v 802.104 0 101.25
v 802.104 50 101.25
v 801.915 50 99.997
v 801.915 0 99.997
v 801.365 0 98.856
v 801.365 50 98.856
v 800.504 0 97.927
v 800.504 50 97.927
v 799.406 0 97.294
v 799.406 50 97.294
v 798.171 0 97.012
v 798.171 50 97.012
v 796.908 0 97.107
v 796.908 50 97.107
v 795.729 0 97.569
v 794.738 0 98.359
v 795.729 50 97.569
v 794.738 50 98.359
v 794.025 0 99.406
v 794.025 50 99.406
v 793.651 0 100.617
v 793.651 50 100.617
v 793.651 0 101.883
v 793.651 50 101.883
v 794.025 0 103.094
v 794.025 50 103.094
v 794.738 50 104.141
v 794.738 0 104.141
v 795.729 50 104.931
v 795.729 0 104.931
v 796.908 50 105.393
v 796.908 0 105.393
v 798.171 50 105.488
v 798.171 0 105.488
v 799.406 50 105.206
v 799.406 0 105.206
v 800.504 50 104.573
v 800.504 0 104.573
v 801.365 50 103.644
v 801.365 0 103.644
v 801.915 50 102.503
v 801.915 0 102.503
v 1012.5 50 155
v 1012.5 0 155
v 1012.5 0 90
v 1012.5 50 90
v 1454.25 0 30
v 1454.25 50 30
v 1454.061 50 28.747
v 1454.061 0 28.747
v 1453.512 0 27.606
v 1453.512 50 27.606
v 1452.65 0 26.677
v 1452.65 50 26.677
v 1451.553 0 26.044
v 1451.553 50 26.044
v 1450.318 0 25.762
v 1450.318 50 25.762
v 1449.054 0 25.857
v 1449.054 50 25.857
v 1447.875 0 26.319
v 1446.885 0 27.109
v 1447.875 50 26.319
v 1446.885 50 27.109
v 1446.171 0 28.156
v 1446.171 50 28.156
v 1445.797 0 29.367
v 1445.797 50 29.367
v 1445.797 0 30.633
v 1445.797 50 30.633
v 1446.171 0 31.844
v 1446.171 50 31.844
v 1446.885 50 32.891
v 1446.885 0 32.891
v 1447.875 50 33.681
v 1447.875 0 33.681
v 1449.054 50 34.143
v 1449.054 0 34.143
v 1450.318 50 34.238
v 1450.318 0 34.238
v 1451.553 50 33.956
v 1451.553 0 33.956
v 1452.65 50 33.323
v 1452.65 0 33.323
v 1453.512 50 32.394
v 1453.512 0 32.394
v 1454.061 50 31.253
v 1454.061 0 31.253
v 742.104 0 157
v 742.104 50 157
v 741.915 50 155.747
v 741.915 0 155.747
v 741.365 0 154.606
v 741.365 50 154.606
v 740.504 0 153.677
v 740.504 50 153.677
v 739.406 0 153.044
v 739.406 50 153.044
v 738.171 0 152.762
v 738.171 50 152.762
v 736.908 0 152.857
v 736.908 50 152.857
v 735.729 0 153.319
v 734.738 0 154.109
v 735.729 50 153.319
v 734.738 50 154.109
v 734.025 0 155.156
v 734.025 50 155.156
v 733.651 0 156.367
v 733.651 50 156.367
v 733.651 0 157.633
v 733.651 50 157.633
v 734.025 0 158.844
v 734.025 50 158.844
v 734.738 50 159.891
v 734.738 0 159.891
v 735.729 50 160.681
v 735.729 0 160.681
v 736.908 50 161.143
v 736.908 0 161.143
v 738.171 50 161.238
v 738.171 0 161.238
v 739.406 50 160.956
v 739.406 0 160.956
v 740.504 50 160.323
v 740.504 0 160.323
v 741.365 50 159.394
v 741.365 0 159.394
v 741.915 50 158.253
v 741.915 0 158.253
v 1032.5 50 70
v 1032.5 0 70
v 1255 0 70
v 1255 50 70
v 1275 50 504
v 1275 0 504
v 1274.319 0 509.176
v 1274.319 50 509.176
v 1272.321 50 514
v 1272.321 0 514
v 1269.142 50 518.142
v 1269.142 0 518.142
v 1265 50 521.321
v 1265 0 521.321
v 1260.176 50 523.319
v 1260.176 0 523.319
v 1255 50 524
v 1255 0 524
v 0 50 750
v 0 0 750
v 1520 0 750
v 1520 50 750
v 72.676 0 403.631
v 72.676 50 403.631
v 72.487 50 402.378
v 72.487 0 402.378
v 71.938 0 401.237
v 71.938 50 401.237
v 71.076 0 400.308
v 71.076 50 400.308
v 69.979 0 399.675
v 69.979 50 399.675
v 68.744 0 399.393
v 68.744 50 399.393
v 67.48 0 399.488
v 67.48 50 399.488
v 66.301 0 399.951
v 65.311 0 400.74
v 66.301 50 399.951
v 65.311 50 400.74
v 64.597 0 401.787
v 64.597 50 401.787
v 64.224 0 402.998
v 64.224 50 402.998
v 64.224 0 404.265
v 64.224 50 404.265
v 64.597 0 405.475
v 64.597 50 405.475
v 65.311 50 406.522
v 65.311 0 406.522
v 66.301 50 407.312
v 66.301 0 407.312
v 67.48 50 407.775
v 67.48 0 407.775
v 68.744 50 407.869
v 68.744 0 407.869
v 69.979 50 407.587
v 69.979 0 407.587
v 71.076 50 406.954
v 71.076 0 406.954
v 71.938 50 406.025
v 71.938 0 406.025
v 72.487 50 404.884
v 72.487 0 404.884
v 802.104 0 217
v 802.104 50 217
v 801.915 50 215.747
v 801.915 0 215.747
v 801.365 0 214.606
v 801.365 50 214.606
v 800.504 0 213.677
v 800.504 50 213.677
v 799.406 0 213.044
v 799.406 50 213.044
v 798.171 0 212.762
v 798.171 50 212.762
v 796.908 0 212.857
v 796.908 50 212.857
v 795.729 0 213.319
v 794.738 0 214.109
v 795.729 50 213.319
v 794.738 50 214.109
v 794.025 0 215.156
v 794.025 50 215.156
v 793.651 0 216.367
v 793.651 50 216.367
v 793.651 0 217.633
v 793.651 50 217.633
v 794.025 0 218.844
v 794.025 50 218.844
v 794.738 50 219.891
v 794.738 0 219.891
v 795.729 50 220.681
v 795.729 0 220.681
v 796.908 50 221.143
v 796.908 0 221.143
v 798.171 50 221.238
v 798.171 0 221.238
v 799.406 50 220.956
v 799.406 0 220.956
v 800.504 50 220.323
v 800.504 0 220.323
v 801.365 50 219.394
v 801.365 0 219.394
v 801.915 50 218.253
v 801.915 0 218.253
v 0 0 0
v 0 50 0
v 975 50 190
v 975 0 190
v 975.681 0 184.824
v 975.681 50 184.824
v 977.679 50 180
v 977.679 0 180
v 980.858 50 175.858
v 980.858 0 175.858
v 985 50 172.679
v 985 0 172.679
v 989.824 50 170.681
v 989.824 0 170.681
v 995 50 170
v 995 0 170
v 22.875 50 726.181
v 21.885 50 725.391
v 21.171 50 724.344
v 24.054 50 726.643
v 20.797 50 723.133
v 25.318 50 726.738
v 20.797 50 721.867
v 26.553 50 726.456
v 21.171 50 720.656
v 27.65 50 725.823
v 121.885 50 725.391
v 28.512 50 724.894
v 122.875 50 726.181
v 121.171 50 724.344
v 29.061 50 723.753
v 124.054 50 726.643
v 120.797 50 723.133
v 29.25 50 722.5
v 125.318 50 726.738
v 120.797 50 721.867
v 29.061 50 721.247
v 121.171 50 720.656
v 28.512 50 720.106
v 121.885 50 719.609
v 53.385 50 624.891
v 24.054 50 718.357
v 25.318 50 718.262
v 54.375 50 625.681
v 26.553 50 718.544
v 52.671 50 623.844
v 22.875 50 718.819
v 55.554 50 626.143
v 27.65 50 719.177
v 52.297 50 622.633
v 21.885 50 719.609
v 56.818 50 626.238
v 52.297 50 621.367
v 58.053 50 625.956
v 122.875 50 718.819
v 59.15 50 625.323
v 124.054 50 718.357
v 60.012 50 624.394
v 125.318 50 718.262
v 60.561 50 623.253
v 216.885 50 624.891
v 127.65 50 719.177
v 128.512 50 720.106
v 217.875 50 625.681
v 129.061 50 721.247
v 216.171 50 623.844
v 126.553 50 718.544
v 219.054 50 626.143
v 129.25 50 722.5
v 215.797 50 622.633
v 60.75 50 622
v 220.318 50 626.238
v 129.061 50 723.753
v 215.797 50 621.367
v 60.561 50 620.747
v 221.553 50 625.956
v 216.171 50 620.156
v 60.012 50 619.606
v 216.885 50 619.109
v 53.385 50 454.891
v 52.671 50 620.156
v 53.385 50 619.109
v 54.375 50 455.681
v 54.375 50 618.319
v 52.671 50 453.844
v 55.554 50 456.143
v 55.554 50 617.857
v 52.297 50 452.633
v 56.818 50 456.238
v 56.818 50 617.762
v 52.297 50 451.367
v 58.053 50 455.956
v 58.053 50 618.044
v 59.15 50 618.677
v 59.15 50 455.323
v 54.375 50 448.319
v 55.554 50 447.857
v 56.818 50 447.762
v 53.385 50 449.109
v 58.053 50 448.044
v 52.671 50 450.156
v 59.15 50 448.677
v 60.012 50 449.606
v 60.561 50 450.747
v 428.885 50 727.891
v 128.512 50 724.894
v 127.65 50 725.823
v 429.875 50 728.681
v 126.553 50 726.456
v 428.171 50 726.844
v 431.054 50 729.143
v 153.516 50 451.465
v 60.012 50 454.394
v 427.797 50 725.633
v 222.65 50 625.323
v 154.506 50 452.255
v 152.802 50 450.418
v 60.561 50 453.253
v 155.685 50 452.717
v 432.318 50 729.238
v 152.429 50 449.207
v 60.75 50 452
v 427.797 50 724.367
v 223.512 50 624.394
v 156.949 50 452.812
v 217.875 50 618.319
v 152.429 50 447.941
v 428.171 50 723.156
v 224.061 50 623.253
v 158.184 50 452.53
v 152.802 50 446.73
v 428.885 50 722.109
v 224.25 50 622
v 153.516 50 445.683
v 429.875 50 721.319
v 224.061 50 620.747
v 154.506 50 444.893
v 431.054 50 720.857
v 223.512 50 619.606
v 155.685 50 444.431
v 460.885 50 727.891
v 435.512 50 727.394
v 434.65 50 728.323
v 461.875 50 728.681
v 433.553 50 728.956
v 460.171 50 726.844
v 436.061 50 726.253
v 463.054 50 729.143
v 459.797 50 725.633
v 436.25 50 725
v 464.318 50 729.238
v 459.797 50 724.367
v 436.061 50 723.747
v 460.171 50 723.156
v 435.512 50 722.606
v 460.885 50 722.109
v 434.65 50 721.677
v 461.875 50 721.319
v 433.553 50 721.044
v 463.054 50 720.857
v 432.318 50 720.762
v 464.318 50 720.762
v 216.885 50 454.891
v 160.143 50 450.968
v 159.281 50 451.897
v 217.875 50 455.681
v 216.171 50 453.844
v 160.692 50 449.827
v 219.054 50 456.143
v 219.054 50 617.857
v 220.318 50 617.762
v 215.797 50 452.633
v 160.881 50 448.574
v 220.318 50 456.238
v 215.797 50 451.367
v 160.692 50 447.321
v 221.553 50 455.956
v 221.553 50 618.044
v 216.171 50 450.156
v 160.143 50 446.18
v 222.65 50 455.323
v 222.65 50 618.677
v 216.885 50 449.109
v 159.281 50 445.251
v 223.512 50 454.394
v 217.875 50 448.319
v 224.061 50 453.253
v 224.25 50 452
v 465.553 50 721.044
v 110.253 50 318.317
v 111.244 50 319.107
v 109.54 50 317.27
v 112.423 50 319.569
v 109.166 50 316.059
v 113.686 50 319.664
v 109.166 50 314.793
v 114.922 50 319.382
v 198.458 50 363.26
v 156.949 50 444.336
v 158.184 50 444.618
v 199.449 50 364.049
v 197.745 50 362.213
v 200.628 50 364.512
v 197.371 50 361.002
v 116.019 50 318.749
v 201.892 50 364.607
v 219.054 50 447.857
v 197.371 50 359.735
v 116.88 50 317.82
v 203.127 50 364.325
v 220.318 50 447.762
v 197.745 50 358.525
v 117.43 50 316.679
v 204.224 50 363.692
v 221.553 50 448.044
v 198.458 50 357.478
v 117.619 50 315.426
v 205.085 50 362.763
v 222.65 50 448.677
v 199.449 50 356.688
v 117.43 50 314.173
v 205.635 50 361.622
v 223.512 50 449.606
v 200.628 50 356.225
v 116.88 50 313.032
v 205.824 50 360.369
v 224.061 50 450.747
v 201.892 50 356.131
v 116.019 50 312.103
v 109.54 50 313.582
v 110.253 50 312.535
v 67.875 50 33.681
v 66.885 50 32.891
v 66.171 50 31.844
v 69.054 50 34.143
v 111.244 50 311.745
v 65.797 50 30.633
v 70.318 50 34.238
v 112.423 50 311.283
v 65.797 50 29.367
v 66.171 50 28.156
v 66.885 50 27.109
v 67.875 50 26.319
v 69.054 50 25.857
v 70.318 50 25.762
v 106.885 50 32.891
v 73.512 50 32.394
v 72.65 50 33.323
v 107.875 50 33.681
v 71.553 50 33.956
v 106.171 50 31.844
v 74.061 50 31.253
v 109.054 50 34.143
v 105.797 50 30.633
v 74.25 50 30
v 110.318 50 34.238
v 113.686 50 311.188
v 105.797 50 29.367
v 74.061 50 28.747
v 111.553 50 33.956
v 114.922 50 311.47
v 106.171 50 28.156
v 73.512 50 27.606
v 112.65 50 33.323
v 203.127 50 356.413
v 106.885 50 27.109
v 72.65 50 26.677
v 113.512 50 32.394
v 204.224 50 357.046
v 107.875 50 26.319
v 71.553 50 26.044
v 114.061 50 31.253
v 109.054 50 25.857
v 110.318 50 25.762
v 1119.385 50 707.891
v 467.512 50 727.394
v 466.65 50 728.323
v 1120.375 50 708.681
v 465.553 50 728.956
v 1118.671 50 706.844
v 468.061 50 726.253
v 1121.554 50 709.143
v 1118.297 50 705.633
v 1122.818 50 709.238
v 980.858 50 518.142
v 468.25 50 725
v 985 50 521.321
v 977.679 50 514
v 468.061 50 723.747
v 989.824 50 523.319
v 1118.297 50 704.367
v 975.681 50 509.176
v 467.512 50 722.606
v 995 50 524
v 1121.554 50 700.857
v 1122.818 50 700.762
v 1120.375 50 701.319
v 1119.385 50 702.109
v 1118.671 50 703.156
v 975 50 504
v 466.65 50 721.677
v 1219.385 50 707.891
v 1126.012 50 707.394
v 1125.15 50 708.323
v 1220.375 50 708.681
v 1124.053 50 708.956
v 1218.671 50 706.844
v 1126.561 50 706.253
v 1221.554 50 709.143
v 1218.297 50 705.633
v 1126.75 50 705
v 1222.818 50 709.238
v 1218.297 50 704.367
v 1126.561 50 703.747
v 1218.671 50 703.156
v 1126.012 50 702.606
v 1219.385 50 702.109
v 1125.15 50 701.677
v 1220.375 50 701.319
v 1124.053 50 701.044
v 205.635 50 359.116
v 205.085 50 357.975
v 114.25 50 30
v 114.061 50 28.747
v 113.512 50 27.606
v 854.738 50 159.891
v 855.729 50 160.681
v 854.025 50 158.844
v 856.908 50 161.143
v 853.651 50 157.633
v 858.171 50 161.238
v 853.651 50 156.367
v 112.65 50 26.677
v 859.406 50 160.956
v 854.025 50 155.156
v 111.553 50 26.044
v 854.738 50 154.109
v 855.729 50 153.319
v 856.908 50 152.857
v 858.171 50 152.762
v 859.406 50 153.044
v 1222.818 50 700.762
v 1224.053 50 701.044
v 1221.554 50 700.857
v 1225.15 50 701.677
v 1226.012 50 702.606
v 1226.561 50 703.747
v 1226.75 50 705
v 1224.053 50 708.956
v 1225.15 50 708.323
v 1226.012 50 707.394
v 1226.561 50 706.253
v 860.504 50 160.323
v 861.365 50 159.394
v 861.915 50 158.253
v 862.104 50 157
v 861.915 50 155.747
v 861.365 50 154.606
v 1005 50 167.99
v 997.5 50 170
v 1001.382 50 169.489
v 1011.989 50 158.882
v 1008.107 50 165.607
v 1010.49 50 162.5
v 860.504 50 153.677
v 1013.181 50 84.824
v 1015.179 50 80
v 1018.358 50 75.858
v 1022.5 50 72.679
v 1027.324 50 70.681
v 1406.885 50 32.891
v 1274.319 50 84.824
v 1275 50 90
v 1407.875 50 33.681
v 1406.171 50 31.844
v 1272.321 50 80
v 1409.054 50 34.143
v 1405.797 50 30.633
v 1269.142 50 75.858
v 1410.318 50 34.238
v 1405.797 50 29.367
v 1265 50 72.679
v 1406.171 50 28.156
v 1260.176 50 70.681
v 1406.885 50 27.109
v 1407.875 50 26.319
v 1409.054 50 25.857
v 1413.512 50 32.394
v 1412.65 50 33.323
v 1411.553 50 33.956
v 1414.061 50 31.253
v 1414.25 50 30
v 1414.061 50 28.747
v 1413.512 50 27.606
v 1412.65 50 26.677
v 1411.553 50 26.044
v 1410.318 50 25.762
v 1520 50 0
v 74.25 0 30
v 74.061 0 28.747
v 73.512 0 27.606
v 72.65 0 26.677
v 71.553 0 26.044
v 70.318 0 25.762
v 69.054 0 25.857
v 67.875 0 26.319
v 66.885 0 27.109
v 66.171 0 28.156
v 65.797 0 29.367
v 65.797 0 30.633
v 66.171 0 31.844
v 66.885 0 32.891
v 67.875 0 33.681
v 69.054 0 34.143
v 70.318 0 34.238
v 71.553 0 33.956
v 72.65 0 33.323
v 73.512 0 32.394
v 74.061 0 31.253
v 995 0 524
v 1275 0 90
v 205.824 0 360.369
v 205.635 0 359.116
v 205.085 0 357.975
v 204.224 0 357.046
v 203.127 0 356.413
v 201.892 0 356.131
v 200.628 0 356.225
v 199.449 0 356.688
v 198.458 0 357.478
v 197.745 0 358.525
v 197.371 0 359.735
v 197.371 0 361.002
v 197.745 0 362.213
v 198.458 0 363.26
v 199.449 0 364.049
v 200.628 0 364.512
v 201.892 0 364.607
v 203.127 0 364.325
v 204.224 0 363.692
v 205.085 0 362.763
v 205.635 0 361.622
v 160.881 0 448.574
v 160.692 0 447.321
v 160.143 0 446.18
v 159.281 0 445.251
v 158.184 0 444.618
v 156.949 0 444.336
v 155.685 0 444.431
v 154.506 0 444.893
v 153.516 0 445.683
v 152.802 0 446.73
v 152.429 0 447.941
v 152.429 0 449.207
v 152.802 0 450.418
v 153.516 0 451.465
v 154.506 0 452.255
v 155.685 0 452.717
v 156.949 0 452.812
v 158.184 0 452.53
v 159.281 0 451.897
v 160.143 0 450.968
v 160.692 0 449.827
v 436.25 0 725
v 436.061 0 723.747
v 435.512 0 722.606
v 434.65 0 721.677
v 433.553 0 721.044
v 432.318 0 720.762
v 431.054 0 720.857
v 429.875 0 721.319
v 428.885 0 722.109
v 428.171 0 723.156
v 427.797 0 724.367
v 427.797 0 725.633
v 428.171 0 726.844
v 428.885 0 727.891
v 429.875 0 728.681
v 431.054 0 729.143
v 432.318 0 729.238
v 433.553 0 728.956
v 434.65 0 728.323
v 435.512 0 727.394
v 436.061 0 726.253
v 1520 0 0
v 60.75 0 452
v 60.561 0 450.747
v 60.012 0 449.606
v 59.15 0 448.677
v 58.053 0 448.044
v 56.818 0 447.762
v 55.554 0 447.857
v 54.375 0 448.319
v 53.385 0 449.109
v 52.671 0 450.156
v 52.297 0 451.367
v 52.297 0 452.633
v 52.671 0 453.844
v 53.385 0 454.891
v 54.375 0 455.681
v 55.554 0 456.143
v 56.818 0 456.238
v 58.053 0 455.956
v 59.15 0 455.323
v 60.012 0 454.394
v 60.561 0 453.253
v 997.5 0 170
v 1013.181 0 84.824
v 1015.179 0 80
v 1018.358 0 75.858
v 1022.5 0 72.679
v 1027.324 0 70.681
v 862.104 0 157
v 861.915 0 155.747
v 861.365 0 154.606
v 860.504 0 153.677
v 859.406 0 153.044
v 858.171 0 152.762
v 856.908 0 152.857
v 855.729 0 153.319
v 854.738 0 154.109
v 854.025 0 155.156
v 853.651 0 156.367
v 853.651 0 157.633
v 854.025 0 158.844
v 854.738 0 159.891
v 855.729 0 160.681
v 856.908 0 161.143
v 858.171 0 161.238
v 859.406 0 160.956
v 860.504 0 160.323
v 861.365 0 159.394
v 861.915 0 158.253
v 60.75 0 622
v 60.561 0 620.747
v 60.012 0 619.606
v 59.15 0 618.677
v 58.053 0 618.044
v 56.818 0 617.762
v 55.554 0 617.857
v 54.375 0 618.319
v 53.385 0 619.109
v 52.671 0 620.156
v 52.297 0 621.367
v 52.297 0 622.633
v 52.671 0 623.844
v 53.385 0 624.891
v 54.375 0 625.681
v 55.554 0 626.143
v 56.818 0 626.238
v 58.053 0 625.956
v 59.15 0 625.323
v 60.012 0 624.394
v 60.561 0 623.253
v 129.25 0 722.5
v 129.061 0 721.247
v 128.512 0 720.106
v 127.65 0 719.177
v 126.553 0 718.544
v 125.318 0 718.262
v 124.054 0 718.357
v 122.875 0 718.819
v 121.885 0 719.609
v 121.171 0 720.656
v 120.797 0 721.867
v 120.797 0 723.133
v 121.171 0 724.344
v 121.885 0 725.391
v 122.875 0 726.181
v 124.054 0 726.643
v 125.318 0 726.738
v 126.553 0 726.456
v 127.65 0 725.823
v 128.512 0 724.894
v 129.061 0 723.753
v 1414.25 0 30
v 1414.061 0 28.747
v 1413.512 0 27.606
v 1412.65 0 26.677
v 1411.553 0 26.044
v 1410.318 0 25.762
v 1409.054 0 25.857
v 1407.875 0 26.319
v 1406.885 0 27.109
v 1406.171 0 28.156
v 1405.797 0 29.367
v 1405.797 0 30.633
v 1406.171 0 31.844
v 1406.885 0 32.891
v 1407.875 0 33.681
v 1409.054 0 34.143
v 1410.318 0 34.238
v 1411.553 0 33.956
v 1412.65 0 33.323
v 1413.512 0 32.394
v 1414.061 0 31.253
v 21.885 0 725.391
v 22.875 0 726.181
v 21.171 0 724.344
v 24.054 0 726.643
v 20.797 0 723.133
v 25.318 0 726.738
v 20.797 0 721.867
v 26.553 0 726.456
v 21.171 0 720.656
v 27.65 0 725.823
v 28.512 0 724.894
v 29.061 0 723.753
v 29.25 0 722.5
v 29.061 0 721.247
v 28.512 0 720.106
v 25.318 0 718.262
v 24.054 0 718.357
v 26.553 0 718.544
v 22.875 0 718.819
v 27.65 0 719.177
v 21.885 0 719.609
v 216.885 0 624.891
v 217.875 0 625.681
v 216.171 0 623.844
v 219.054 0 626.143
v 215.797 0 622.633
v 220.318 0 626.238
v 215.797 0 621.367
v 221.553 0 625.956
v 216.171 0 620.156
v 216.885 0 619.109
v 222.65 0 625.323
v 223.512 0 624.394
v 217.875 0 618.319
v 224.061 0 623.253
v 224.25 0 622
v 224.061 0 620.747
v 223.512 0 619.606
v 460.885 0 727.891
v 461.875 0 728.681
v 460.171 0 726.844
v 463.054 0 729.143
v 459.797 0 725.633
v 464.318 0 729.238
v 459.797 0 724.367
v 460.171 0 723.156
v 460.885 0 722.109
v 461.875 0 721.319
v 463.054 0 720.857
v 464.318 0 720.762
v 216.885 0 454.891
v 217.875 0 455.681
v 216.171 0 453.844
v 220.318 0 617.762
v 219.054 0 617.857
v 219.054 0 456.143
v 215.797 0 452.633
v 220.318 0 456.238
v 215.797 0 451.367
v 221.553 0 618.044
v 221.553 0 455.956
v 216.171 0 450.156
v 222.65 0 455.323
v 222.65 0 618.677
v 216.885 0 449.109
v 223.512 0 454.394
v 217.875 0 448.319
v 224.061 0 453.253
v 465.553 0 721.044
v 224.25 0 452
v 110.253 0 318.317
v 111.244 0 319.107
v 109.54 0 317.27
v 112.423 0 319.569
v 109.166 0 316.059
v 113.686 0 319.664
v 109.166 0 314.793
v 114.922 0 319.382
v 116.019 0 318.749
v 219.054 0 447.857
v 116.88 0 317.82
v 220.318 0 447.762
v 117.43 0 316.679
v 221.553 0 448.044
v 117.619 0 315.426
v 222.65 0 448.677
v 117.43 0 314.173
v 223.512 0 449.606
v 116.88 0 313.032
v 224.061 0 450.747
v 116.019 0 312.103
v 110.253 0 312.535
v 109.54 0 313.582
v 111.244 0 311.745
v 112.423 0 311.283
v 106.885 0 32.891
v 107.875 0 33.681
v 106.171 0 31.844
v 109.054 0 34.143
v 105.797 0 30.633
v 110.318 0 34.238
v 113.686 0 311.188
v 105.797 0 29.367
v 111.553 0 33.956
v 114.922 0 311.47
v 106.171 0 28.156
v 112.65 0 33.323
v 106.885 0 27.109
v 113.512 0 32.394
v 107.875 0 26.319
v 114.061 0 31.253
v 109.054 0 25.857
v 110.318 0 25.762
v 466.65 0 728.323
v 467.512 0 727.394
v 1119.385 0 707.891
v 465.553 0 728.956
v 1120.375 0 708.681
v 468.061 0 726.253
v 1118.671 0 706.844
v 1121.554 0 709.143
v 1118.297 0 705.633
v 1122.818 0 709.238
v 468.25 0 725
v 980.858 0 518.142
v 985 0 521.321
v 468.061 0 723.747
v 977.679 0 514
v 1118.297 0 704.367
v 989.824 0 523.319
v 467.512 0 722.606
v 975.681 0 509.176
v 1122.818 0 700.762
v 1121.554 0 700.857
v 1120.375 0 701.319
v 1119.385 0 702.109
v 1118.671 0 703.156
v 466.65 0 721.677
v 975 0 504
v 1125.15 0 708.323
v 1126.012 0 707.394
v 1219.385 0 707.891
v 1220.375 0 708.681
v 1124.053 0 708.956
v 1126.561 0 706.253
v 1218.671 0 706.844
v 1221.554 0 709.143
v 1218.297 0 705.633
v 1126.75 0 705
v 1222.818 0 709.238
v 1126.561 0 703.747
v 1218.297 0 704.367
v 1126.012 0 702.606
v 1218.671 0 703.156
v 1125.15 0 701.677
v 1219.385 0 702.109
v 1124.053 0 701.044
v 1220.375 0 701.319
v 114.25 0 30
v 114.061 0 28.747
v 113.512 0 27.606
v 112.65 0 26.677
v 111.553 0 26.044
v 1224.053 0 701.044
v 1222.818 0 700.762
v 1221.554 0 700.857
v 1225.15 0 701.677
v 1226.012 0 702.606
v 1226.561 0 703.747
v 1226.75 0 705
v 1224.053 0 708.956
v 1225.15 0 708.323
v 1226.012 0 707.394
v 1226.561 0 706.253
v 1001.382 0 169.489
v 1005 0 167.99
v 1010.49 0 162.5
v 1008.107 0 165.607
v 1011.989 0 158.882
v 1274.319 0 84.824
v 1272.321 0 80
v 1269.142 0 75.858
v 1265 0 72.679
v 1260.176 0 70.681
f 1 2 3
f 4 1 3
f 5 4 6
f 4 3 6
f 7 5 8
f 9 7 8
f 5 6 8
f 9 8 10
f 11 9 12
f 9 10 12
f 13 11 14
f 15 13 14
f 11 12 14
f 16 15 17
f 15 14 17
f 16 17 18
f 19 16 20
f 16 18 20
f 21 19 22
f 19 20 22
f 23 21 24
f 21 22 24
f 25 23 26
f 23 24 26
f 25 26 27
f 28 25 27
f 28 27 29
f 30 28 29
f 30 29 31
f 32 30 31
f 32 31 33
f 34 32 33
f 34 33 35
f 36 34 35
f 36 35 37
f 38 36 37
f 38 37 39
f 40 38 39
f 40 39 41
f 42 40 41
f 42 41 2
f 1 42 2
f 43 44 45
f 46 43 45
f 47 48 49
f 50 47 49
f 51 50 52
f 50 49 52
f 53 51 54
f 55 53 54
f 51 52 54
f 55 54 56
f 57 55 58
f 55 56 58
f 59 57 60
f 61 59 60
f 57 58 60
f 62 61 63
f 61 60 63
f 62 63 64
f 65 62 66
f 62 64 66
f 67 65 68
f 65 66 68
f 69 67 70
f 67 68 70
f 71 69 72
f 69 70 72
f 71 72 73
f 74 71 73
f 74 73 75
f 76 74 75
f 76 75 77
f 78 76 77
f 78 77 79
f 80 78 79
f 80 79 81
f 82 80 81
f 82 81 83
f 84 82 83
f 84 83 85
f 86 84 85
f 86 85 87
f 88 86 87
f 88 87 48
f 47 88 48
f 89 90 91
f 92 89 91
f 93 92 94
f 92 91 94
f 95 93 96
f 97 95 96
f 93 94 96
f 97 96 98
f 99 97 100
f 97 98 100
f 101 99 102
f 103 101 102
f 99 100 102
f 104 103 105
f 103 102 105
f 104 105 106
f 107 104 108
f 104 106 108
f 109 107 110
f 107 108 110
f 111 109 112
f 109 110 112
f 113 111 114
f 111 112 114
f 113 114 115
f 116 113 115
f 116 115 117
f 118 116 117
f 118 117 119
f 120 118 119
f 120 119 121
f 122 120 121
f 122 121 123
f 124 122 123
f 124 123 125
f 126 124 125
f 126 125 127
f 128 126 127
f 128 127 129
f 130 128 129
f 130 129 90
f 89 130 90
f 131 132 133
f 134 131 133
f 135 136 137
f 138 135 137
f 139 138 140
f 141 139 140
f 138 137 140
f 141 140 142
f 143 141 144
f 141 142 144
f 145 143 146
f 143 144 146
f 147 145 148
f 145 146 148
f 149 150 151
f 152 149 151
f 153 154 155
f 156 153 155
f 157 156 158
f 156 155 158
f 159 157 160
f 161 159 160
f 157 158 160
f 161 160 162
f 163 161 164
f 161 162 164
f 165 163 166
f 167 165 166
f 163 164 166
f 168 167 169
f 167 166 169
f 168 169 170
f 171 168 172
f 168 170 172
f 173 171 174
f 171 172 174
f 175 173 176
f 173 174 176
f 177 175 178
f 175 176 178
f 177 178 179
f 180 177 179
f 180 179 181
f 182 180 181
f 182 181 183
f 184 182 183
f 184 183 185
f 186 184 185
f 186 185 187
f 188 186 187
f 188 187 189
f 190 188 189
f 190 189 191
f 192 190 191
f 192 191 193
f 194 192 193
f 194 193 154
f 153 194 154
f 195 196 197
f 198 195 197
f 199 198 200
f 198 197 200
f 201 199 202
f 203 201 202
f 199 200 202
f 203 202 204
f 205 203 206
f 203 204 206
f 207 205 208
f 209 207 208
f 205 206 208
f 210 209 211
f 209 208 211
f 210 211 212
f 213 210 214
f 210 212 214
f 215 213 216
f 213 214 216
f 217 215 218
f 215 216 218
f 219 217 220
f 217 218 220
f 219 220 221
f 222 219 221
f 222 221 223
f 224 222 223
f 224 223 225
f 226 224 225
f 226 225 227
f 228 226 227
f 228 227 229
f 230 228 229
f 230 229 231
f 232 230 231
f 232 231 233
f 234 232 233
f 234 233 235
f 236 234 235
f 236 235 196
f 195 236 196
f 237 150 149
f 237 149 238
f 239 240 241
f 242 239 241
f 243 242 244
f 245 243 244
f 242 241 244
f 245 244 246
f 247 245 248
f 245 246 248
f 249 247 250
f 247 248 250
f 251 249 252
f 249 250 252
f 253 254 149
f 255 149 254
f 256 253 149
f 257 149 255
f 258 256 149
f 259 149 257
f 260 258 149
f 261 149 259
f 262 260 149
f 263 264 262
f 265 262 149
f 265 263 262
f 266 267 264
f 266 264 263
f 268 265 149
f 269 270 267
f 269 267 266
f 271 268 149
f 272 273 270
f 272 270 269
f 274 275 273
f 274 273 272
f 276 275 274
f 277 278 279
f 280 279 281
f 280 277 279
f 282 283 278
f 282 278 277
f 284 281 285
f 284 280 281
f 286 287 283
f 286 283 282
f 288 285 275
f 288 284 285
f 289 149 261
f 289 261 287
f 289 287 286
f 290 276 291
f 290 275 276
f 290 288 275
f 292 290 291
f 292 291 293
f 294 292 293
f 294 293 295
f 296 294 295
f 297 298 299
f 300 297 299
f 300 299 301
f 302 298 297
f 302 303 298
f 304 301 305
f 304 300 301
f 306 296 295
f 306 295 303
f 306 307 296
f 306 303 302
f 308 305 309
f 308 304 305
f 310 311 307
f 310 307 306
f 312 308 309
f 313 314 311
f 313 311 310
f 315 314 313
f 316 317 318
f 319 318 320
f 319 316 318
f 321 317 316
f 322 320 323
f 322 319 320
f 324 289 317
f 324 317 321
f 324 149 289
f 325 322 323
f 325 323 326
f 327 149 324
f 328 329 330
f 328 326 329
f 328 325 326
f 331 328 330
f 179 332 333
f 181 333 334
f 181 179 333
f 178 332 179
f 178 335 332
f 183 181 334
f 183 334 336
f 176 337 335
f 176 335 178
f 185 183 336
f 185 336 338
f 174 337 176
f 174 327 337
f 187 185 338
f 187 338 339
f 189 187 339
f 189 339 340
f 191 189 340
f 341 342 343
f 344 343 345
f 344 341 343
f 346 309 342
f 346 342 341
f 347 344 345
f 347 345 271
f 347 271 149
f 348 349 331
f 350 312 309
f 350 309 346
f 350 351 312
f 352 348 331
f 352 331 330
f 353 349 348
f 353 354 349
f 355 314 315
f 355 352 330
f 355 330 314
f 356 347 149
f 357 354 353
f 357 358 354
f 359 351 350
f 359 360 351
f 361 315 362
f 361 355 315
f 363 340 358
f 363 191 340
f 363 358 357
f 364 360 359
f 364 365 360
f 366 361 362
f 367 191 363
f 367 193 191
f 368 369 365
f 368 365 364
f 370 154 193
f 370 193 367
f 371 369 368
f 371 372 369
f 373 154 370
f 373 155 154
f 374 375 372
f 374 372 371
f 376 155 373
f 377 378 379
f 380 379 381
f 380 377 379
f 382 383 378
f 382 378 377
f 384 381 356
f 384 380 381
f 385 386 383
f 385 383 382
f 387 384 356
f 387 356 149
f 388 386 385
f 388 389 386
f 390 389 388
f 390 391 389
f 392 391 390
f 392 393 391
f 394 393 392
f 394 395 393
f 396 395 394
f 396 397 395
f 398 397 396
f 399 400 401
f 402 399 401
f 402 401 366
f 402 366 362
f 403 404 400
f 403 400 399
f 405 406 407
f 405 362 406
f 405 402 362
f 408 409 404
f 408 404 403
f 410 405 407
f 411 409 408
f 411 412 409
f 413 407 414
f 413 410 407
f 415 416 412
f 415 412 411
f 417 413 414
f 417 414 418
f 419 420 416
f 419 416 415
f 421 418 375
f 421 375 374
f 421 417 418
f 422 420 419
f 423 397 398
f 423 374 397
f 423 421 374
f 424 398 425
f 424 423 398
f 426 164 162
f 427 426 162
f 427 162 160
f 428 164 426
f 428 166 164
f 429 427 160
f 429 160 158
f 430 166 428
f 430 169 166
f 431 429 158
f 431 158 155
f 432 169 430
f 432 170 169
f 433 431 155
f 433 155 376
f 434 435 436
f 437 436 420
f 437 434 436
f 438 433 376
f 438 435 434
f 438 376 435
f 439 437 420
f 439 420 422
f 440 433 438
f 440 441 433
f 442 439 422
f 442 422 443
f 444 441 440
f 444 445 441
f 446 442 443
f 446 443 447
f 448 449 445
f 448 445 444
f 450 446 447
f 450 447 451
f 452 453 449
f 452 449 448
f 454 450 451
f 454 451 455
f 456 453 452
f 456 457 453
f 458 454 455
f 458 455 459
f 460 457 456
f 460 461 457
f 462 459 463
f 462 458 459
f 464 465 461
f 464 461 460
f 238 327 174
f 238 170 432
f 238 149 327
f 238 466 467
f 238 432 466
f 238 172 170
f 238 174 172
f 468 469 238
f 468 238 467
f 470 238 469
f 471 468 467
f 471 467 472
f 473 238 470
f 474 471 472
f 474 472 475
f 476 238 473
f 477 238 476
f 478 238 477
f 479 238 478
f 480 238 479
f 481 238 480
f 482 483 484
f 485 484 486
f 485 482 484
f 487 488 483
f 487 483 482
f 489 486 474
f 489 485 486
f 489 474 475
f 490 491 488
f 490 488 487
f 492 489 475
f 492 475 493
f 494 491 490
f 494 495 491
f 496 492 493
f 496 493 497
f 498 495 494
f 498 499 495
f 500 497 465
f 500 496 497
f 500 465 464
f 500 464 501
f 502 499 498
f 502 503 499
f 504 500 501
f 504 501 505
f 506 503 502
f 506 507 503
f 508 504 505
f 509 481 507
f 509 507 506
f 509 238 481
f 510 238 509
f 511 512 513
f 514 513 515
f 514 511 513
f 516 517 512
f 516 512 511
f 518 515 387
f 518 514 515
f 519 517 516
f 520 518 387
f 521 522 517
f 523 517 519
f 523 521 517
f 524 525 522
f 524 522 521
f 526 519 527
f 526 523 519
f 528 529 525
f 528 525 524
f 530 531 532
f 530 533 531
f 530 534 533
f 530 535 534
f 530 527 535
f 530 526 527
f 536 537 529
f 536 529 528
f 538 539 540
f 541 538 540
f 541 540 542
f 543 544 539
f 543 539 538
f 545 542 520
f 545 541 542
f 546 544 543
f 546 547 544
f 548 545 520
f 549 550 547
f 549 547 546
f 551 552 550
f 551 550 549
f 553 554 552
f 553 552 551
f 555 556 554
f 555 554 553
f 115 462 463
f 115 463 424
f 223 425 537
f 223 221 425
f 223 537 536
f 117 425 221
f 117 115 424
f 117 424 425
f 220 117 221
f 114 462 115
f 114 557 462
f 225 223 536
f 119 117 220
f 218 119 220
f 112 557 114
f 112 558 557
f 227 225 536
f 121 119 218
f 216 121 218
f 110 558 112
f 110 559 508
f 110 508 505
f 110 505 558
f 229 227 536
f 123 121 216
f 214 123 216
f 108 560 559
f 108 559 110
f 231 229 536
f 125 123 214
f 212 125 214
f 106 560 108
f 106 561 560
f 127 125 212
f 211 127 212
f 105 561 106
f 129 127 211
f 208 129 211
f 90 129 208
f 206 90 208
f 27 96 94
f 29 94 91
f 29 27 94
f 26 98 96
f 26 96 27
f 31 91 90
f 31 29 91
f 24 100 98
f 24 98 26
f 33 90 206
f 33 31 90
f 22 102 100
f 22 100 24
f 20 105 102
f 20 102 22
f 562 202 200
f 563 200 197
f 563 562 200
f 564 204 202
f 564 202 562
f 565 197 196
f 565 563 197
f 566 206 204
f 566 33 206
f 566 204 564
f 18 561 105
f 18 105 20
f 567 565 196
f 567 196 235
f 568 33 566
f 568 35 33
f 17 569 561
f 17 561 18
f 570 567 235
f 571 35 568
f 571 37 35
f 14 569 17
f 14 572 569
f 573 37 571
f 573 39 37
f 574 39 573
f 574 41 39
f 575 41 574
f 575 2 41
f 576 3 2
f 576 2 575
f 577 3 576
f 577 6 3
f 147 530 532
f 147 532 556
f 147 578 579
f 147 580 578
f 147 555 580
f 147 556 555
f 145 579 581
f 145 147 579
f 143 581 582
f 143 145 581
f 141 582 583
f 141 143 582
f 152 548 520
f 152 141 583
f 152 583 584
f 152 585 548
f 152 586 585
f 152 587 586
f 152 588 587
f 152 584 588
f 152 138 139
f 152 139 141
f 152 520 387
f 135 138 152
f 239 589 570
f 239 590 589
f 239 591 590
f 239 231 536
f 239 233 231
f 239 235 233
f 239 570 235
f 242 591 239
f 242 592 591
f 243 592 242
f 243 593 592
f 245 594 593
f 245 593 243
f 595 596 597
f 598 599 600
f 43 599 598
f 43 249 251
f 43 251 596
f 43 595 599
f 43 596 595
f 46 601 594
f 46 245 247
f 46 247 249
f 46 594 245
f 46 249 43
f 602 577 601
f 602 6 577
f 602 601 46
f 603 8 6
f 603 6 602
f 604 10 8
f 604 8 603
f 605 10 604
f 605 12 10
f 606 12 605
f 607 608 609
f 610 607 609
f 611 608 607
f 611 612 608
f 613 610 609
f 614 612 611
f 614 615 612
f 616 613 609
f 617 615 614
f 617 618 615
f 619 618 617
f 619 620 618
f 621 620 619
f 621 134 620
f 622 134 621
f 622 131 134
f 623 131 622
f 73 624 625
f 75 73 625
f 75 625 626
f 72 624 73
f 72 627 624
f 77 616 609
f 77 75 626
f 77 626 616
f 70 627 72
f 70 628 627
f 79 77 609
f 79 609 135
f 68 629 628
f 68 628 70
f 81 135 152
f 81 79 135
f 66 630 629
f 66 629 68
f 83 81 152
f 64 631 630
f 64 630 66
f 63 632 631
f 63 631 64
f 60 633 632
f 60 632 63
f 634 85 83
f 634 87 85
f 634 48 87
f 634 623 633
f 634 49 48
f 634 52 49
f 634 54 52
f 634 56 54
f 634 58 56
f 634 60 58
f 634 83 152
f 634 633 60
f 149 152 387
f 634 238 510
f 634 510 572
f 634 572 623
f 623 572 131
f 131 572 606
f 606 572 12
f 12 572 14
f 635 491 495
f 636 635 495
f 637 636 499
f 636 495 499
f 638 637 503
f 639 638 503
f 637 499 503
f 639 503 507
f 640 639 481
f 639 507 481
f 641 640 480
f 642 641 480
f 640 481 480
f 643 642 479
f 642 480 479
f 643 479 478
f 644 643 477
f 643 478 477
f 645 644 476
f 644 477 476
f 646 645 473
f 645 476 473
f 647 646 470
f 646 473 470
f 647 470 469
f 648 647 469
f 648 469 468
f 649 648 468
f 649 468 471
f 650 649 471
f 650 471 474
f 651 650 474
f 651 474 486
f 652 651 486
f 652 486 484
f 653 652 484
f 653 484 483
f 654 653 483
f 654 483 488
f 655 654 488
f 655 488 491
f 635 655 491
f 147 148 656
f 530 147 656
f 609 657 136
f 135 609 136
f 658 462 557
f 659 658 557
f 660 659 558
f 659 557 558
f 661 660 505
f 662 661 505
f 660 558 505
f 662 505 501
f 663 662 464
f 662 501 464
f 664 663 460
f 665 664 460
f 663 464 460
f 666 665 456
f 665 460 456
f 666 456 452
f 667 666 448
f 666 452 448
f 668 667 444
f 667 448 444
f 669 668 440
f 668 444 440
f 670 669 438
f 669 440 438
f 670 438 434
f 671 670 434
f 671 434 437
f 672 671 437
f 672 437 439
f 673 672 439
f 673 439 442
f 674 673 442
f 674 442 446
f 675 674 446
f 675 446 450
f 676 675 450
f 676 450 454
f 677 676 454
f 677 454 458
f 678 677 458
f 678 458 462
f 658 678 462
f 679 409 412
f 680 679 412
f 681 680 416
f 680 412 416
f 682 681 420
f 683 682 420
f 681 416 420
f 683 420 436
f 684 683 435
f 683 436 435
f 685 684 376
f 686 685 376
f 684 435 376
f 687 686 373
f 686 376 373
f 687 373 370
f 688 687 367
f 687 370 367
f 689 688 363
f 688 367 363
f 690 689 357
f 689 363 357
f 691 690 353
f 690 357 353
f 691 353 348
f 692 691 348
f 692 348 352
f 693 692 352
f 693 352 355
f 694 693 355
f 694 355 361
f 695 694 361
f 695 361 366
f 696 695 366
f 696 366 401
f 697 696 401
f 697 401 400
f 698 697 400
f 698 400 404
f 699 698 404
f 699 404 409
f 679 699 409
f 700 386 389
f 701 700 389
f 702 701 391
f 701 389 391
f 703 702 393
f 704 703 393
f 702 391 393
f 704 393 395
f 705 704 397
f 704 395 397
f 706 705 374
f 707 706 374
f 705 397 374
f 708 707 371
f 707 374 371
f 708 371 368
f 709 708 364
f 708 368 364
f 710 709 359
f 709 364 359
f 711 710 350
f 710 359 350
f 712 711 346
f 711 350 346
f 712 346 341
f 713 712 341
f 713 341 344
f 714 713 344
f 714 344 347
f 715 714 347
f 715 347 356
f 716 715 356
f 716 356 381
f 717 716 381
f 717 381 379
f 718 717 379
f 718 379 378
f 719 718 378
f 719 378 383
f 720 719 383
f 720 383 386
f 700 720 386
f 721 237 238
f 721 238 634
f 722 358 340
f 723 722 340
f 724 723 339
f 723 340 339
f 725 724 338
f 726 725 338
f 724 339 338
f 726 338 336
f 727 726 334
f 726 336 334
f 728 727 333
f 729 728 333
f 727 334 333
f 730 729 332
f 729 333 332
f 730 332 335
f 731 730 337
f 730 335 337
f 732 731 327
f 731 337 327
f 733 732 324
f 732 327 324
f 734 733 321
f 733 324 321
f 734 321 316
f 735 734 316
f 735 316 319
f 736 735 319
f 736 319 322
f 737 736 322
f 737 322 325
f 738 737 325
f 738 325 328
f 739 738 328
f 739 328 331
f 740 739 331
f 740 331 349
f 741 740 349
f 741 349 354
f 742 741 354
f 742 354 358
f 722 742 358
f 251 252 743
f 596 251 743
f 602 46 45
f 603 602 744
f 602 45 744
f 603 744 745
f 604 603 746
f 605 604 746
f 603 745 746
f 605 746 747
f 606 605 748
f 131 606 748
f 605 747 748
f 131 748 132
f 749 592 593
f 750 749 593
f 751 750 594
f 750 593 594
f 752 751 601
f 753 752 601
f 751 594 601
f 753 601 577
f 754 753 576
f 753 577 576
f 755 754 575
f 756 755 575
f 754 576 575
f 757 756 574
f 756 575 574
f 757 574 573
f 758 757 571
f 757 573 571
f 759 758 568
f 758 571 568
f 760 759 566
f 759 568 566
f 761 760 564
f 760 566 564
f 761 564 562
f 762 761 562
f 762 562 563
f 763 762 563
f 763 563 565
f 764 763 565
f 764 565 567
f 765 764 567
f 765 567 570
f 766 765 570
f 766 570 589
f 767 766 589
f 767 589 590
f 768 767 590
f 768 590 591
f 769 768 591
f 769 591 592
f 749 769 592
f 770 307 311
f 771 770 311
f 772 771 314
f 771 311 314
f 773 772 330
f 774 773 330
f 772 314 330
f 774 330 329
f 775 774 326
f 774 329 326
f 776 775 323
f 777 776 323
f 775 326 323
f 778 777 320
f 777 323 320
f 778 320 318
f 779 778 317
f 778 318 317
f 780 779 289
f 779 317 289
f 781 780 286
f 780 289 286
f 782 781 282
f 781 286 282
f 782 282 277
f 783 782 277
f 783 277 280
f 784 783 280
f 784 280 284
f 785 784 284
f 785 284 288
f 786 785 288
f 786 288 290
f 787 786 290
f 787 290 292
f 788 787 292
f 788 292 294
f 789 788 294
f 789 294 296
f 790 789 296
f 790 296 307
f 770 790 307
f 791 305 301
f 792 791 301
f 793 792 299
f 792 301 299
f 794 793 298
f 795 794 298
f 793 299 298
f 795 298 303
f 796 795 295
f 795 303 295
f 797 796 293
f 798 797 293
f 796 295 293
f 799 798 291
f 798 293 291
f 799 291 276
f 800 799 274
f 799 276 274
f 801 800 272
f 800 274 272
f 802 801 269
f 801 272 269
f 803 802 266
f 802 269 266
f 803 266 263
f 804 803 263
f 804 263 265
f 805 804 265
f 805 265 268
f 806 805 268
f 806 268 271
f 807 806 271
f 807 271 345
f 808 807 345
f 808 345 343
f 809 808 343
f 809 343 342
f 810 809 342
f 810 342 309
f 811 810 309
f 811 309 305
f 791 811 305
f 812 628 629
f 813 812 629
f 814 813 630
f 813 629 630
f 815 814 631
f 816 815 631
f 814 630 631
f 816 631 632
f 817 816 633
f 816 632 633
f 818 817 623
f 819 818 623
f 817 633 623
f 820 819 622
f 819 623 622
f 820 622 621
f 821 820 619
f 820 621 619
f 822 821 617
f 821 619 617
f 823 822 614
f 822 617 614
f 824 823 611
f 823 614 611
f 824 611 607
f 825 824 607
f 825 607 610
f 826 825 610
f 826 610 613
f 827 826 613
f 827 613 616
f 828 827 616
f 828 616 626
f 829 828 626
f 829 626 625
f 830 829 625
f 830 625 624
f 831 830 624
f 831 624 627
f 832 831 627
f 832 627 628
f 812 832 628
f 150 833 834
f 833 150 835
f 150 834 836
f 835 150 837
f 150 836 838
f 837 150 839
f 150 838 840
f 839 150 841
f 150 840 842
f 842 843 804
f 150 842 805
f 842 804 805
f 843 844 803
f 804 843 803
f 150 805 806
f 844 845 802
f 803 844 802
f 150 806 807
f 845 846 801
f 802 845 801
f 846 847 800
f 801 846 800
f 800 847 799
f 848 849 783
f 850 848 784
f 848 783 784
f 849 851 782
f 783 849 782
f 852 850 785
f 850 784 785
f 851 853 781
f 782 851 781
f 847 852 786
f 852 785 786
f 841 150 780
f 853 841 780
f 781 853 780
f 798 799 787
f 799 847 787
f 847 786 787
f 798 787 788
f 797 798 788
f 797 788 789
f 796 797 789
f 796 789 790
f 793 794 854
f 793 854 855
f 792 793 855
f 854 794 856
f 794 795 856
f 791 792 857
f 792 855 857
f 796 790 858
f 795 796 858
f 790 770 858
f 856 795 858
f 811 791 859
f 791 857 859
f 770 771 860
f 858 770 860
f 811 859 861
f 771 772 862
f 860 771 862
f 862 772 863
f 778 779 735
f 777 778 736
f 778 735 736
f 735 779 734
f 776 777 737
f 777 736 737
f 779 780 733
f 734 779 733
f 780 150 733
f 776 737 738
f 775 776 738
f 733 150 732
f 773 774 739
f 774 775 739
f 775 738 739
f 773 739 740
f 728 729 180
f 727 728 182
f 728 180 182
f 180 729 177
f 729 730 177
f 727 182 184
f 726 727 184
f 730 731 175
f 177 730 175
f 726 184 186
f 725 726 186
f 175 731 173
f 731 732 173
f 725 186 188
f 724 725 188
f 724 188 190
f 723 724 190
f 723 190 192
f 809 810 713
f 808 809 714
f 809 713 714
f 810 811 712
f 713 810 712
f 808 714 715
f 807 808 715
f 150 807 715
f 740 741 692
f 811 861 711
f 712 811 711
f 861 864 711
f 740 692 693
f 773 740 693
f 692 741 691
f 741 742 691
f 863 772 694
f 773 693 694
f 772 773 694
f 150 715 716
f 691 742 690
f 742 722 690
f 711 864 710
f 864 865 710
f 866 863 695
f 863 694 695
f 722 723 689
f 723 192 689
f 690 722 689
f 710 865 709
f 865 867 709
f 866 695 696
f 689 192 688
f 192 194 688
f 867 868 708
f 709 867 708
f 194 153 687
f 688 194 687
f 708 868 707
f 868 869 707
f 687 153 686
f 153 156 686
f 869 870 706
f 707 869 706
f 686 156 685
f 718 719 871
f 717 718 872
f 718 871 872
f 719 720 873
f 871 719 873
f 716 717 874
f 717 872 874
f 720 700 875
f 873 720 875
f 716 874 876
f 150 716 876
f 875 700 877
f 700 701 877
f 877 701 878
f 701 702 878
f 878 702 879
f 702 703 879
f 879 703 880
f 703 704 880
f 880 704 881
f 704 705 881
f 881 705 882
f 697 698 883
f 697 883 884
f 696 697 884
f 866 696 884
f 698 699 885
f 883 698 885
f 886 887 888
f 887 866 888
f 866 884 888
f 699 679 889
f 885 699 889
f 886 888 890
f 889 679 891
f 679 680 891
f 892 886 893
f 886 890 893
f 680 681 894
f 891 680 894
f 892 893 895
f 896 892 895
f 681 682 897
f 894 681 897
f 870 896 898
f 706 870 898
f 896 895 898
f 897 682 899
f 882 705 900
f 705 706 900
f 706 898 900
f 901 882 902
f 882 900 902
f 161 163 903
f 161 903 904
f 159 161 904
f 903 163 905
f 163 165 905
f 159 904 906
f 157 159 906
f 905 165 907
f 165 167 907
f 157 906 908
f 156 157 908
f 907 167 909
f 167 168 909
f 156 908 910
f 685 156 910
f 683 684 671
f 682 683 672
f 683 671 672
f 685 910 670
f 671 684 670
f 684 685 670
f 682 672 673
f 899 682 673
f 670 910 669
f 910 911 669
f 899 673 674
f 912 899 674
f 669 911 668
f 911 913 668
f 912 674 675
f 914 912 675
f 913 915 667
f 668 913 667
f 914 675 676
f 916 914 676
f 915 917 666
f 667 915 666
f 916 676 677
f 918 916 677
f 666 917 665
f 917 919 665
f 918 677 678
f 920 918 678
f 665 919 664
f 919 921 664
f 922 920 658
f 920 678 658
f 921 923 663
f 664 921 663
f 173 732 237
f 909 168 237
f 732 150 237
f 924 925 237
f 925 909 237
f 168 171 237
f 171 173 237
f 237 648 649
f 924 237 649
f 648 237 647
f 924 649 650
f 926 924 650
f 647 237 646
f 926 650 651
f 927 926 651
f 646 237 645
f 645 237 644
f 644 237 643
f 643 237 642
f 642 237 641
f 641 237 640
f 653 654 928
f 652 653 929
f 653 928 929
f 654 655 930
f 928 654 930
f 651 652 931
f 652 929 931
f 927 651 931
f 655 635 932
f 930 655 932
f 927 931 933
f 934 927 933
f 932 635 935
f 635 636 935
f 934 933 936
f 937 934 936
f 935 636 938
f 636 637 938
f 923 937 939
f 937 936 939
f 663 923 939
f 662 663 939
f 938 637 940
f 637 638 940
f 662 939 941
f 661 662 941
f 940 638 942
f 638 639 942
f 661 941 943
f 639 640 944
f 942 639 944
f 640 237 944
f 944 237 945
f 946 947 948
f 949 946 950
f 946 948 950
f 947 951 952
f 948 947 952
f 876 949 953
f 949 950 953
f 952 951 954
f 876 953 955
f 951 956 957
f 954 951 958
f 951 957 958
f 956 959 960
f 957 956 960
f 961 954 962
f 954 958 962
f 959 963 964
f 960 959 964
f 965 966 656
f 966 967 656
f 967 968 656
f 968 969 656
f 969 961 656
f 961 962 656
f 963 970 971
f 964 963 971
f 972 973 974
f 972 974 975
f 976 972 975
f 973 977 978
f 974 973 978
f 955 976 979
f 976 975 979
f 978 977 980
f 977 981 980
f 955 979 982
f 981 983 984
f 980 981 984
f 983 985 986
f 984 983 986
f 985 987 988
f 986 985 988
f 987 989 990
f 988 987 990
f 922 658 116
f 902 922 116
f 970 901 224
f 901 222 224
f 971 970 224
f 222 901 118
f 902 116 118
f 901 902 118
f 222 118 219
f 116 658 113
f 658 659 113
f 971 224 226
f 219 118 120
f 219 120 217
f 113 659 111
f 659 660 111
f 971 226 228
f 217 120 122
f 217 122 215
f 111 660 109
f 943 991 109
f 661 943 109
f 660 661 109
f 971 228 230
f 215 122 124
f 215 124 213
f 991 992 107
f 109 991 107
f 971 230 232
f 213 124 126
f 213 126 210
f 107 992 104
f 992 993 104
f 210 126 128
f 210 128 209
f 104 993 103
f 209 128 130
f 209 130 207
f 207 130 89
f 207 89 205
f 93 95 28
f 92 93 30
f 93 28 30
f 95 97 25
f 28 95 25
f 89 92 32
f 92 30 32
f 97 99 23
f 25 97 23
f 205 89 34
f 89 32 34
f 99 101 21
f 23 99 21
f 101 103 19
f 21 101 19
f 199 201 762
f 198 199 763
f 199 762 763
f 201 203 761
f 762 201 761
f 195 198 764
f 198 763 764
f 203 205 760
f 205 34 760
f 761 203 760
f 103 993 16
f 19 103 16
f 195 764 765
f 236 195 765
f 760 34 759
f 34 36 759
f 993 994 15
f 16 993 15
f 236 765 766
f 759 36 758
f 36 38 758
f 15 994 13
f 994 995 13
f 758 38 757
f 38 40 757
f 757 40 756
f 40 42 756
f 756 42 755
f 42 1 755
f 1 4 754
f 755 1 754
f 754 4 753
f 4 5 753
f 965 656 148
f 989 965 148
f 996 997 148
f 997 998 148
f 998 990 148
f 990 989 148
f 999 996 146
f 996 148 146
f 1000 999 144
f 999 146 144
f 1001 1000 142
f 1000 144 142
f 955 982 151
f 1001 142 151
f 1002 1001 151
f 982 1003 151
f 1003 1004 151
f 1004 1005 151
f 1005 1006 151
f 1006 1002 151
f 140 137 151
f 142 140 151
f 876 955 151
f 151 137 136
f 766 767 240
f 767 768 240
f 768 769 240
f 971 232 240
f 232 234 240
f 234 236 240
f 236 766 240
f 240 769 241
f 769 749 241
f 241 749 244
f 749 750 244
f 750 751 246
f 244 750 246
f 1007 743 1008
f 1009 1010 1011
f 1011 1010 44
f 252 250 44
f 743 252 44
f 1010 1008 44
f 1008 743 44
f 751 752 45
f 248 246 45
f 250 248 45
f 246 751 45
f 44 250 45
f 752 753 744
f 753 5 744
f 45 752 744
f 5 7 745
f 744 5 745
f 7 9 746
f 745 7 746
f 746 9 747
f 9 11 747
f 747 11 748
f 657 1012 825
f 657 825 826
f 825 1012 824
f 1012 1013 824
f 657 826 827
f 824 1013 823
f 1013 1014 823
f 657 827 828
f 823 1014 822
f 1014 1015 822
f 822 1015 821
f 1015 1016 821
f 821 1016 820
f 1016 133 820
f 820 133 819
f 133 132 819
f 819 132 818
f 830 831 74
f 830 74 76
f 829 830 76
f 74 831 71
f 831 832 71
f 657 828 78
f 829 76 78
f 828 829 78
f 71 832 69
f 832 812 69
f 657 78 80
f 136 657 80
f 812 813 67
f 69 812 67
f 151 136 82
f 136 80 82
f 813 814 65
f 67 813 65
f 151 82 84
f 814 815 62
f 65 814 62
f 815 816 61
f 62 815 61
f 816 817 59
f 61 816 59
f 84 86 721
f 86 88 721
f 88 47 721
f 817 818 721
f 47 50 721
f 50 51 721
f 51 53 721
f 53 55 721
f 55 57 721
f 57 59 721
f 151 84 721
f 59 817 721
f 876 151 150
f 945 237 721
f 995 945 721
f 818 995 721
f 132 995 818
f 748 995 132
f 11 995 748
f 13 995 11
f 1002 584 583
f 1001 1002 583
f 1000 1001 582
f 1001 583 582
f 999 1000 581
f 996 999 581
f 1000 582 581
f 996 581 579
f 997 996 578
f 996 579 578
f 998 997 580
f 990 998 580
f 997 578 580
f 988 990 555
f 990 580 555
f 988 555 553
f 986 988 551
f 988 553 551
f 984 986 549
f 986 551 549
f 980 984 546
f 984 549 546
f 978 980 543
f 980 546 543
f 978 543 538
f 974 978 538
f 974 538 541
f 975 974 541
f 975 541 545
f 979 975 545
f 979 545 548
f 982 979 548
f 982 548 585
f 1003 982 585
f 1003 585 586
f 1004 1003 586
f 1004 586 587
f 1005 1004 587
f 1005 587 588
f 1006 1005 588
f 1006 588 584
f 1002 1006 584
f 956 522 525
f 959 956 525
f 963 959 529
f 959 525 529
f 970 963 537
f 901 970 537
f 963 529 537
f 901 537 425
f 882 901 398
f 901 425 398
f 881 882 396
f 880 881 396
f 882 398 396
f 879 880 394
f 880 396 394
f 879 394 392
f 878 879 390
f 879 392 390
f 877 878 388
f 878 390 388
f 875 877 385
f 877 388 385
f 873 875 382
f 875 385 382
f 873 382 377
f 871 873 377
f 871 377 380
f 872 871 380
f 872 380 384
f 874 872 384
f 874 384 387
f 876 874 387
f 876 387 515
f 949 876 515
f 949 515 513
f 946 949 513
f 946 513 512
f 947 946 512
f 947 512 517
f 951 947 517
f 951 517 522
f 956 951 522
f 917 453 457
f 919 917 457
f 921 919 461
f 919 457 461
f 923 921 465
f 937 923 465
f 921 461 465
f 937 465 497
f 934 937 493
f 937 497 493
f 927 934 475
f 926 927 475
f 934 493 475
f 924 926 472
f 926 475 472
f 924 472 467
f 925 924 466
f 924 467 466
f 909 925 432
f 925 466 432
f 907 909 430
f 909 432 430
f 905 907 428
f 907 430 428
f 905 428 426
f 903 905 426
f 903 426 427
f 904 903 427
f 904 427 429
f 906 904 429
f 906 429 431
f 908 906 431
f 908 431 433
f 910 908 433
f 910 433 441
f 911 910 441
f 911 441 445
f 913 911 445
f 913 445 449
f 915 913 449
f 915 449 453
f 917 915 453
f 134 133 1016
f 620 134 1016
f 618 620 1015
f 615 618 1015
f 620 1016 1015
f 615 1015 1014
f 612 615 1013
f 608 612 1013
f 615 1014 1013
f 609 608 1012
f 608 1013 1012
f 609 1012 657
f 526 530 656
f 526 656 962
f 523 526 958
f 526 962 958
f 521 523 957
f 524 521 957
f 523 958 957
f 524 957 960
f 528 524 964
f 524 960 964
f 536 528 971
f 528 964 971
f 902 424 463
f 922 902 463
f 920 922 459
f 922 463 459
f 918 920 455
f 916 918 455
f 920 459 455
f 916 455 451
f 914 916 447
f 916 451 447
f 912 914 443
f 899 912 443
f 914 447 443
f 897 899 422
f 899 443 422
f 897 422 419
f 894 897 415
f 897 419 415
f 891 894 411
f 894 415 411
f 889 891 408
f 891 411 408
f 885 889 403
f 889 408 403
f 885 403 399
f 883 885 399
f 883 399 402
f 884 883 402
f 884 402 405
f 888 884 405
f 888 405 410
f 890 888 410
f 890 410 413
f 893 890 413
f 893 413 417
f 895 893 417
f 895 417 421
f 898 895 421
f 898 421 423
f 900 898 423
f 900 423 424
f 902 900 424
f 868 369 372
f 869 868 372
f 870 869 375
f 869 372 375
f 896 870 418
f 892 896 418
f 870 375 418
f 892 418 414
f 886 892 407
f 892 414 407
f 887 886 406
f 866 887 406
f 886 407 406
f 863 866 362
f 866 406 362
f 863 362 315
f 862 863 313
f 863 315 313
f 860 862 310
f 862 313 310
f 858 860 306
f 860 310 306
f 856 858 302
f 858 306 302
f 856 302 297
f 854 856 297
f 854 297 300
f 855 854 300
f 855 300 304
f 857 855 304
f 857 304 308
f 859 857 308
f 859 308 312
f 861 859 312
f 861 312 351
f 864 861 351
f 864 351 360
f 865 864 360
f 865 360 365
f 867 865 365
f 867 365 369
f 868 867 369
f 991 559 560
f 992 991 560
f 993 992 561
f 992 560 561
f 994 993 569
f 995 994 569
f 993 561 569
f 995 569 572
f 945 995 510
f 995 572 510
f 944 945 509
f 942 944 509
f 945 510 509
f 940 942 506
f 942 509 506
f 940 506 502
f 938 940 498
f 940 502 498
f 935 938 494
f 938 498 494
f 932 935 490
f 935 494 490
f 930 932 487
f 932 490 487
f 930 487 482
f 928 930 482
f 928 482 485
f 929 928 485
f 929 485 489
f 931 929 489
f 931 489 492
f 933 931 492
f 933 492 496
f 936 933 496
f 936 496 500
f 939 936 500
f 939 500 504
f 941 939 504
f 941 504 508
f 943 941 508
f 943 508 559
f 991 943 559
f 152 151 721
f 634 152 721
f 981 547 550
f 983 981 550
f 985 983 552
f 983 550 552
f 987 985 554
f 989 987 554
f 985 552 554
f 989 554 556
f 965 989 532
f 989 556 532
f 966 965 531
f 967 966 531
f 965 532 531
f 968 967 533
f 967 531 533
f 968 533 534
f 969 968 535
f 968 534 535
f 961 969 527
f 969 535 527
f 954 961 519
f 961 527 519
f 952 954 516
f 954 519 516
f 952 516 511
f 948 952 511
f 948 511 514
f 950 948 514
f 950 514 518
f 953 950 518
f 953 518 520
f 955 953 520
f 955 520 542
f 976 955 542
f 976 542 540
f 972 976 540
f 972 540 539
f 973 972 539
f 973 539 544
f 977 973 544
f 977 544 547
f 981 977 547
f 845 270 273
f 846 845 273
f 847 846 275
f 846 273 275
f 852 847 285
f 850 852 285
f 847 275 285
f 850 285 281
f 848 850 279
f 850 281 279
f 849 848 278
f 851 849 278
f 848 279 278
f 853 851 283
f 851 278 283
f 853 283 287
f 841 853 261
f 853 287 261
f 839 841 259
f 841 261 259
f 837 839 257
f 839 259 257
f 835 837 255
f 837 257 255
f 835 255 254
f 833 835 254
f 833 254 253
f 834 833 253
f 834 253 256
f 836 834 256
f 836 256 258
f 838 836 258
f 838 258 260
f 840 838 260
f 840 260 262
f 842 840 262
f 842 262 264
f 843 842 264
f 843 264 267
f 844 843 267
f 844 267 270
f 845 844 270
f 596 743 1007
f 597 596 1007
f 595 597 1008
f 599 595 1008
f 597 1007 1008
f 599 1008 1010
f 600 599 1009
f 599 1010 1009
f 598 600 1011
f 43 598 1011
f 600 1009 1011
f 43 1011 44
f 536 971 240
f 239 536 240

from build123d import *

# Parameters (mm, degrees)
SKIZZE3_W                       = 1520
SKIZZE3_H                       = 750
AUFSATZ_LINEAR_AUSTRAGEN1_DEPTH = 50
M10_GEWINDEBOHRUNG1_D           = 8.5


with BuildPart() as part:
    # Skizze3 → Aufsatz-Linear austragen1 (new body)
    with BuildSketch(Plane(origin=(0, 0, 0), x_dir=(1, 0, 0), z_dir=(0, 1, 0))):
        with Locations((760, -375)):
            Rectangle(SKIZZE3_W, SKIZZE3_H)
        with BuildLine():
            Line((995, -170), (997.5, -170))
            ThreePointArc((997.5, -170), (1008.106601718, -165.606601718), (1012.5, -155))
            Line((1012.5, -155), (1012.5, -90))
            ThreePointArc((1012.5, -90), (1018.357864376, -75.857864376), (1032.5, -70))
            Line((1032.5, -70), (1255, -70))
            ThreePointArc((1255, -70), (1269.142135624, -75.857864376), (1275, -90))
            Line((1275, -90), (1275, -504))
            ThreePointArc((1275, -504), (1269.142135624, -518.142135624), (1255, -524))
            Line((1255, -524), (995, -524))
            ThreePointArc((995, -524), (980.857864376, -518.142135624), (975, -504))
            Line((975, -504), (975, -190))
            ThreePointArc((975, -190), (980.857864376, -175.857864376), (995, -170))
        make_face(mode=Mode.SUBTRACT)
    extrude(amount=AUFSATZ_LINEAR_AUSTRAGEN1_DEPTH)

    # M10 Gewindebohrung1 (through all)
    with Locations(Plane(origin=(0, 0, 0), x_dir=(-1, 0, 0), z_dir=(0, -1, 0))):
        with Locations((-70, -30), (-110, -30), (-432, -725), (-464, -725), (-125, -722.5), (-25, -722.5), (-56.5, -622), (-56.5, -452), (-220, -452), (-220, -622), (-68.426043859, -403.631189606), (-1122.5, -705), (-1222.5, -705), (-1410, -30), (-1450, -30), (-113.368810394, -315.426043859), (-201.573956141, -360.368810394), (-156.631189606, -448.573956141), (-797.85367918, -217), (-797.85367918, -101.25), (-857.85367918, -157), (-737.85367918, -157)):
            Hole(M10_GEWINDEBOHRUNG1_D / 2)


solid = part.part
